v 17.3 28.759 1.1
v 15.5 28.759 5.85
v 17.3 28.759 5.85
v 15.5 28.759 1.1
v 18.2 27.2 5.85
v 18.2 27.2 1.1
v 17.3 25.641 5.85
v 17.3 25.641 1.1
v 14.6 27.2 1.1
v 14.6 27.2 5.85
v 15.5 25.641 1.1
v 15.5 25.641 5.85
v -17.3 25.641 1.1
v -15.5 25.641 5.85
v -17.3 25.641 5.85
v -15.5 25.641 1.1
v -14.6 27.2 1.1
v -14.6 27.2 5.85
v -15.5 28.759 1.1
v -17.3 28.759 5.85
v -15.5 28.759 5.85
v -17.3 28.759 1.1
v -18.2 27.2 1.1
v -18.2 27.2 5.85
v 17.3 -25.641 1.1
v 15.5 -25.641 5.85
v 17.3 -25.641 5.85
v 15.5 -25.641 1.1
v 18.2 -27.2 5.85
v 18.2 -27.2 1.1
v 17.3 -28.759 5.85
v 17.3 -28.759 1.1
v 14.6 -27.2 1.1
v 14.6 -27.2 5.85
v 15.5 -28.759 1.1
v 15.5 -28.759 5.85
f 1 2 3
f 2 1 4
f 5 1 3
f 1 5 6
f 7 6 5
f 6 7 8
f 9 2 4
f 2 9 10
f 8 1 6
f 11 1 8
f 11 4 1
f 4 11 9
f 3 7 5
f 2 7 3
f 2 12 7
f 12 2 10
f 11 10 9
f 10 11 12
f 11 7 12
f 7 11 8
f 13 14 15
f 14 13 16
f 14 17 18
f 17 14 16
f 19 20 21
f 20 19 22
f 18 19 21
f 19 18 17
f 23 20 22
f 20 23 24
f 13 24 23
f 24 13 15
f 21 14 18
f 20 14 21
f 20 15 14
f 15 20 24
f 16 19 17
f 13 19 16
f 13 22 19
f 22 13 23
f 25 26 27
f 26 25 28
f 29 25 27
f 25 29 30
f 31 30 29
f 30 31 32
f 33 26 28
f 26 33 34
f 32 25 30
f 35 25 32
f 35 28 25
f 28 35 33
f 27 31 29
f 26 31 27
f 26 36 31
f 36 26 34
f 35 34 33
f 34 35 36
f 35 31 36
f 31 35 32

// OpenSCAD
union() {
  translate([16.4, 27.2, 1.1]) cylinder(r=1.8, h=4.75, center=false);
  translate([-16.4, 27.2, 1.1]) cylinder(r=1.8, h=4.75, center=false);
  translate([16.4, -27.2, 1.1]) cylinder(r=1.8, h=4.75, center=false);
}
